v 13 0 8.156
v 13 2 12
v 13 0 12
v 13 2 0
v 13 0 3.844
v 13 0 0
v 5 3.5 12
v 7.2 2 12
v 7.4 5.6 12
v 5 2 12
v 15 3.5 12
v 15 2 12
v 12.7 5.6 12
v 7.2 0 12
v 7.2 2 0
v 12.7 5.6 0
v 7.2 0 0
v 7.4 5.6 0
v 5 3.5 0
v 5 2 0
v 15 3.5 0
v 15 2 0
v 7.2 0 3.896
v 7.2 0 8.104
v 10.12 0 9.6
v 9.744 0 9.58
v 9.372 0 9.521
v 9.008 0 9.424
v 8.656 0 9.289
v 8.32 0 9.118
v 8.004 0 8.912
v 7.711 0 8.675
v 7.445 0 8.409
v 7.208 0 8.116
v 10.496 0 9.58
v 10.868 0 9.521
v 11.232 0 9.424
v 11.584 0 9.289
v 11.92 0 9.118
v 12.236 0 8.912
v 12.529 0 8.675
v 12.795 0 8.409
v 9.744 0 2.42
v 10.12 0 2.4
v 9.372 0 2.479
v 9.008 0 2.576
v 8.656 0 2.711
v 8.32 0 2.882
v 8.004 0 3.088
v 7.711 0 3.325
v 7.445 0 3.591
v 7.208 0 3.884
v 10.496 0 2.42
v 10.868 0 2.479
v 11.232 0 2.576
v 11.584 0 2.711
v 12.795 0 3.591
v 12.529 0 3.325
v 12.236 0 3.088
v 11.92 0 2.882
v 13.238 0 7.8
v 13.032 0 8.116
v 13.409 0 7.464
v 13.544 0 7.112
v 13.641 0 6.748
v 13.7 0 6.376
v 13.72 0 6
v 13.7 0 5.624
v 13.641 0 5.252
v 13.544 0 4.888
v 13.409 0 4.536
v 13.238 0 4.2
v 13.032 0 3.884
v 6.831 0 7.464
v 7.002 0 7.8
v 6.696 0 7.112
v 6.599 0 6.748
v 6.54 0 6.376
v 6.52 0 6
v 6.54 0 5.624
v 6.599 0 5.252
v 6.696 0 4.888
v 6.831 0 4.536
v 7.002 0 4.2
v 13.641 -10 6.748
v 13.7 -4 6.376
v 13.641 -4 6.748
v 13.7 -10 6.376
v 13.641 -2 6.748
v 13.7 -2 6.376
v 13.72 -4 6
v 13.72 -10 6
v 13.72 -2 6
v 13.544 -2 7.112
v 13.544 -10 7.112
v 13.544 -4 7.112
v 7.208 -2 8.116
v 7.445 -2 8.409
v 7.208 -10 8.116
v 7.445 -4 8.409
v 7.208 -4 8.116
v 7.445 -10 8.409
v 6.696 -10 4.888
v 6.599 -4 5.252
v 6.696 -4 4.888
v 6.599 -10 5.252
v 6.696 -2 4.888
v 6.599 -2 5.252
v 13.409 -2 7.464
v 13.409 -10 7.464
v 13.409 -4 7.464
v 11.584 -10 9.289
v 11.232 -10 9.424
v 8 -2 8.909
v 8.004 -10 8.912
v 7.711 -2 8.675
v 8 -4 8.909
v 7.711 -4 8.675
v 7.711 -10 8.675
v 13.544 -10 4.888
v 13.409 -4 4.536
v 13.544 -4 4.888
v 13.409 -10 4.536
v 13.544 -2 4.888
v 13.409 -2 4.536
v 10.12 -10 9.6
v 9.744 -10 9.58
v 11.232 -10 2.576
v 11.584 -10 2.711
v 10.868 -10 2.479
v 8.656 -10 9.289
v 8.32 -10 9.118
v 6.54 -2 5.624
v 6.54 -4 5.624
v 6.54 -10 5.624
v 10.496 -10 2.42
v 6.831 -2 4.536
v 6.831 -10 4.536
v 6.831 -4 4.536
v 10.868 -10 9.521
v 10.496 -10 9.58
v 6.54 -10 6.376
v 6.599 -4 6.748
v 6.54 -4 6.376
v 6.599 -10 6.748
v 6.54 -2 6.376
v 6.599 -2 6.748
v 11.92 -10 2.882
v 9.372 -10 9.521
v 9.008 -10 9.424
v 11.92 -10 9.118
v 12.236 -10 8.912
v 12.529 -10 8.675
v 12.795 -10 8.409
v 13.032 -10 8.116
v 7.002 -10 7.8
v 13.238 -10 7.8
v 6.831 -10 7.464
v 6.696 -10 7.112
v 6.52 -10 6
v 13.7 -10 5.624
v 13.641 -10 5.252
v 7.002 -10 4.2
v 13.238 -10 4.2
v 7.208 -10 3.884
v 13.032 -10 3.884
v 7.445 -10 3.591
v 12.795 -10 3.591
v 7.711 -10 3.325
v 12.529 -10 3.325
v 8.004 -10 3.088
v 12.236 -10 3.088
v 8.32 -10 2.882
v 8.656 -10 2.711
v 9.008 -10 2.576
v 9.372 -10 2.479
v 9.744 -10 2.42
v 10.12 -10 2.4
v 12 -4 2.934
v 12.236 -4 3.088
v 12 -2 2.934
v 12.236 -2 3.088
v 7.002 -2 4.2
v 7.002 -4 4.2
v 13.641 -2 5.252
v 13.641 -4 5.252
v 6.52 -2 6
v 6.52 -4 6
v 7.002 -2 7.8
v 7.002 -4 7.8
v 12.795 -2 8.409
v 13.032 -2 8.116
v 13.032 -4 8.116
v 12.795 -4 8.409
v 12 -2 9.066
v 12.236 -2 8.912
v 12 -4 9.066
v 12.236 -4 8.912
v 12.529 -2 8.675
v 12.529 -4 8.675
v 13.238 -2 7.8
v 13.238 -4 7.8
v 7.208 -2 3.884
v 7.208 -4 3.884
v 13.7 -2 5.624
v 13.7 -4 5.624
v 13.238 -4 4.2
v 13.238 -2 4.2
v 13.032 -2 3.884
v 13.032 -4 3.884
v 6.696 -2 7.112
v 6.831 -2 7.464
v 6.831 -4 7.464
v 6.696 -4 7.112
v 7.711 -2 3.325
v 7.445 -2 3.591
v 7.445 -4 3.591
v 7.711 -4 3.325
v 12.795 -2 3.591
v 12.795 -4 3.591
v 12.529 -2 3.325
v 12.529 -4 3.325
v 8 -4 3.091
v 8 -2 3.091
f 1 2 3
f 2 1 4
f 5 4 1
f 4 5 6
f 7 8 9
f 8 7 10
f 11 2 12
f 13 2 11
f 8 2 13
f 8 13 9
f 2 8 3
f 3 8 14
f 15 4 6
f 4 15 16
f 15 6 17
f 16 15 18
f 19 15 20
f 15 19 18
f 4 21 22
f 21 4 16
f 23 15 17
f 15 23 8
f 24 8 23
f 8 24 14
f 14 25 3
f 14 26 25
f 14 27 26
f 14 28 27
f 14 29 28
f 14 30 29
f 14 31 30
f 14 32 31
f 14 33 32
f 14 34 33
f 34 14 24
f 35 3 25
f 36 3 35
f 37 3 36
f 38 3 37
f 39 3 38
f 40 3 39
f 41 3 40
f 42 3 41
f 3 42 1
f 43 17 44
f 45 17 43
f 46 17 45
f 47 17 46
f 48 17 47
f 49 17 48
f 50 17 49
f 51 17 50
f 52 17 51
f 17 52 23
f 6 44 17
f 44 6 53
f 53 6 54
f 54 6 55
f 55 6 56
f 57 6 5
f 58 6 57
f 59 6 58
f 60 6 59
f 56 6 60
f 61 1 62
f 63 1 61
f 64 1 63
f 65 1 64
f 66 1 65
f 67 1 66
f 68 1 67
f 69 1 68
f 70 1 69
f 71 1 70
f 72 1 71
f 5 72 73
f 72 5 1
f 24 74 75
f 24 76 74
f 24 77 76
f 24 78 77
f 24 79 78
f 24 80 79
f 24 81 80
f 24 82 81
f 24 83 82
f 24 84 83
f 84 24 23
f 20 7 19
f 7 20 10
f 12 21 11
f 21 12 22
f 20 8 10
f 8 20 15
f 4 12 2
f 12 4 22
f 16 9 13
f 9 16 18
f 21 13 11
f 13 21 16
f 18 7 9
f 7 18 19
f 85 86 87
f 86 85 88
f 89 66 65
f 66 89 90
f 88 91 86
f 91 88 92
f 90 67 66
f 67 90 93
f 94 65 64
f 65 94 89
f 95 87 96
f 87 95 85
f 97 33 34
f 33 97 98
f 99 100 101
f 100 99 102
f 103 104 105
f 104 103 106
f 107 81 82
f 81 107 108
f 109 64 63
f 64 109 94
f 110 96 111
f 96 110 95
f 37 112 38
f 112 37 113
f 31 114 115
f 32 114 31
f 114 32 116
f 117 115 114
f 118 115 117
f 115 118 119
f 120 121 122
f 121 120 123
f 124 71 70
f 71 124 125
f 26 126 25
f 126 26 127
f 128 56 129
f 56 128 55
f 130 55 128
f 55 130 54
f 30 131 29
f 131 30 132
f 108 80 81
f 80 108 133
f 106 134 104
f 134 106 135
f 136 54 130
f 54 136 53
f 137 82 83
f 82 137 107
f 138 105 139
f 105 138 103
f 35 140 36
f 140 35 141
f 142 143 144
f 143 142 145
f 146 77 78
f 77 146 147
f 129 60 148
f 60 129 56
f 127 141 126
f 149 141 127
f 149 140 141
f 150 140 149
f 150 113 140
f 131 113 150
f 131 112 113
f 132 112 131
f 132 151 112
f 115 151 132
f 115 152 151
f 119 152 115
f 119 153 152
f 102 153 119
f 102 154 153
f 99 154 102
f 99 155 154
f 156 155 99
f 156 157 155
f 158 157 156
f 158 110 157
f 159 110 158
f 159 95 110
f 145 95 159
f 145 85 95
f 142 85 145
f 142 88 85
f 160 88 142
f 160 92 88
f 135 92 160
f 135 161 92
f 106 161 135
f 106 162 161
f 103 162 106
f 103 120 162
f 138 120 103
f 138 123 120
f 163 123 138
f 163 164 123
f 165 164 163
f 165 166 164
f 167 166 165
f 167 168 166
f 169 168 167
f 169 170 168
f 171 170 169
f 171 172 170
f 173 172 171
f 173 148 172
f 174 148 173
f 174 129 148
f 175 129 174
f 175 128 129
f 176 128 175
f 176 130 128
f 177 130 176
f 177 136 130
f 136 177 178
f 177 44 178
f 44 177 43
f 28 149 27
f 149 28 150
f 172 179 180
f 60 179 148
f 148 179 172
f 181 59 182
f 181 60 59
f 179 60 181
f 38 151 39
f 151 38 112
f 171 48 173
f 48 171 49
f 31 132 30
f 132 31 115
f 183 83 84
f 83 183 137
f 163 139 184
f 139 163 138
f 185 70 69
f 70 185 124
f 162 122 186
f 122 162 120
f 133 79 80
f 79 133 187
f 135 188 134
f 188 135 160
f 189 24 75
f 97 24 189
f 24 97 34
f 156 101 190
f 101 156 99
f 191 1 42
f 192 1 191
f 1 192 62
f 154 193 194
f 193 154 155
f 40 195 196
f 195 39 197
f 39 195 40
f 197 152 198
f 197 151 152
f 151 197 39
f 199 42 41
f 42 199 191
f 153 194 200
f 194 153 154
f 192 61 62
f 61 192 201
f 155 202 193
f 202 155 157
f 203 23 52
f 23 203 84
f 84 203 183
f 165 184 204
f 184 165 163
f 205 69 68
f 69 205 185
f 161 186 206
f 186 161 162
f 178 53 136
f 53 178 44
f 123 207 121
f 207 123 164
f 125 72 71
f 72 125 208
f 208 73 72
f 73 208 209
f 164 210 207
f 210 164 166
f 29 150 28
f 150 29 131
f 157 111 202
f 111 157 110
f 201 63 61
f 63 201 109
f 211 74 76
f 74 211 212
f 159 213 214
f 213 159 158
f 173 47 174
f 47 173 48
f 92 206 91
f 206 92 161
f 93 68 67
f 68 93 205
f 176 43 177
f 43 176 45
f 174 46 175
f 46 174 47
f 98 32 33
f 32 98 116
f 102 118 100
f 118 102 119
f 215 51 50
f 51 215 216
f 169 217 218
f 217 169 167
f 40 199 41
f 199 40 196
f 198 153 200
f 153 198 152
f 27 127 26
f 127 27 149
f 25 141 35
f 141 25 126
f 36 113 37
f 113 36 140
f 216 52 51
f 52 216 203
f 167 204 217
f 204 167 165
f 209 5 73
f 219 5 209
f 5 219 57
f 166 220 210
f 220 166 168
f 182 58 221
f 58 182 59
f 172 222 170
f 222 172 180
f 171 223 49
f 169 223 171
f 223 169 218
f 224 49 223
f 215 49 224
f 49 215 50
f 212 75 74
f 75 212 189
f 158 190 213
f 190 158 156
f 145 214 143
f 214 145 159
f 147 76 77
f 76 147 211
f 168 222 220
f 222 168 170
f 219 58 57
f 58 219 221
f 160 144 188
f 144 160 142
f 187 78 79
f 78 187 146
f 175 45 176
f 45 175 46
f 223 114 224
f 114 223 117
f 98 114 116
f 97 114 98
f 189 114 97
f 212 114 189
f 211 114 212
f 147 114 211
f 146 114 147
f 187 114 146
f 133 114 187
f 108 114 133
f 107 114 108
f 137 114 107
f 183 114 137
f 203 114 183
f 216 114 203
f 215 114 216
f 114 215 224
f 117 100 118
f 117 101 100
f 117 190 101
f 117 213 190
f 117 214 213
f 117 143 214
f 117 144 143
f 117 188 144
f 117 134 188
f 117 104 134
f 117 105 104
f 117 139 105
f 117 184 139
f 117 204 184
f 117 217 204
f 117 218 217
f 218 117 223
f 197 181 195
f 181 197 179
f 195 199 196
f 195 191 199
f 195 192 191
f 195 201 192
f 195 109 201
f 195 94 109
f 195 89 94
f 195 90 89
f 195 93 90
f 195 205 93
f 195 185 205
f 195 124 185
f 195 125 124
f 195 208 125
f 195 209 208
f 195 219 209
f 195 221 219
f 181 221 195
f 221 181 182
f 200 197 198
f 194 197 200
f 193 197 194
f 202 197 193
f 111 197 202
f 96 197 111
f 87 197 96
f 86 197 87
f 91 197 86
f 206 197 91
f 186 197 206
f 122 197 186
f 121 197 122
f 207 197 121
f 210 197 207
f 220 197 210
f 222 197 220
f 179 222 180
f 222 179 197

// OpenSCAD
echo(version=version());
//include <threads.scad>


// Base Config
base_W = 120; // Min Size < 10
base_H = 40; // Min Size < 40
base_T = 0.5; // Fix Size = 0.5 for Stapler
default_S = 12; // Fix Size = 12 for Stapler (Stapler size)
default_T = 3.0; // Fix Size = 2.0 for Stapler (base_T < default_T)
$fn = 60;
minkowski_R = 2;
outR=14;
pitchN=4;
interR=9;
bladehuckR=0;

// * difference(){
//     import("2020 alu section.STL", convexity=3);
//     translate([-5, -5, 10]) cube([30, 30, 500]);
// }

difference(){
    union() {
        translate([7.2, 0, 0]) cube([5.8, 3, 12]);
        hull() {
            translate([5, 2, 0]) cube([10, 1.5, 12]);
            translate([7.4, 5.5, 0]) cube([5.3, 0.1, 12]);
        }
        #translate([10.12, 0, 6]) rotate([90, 0, 0]) cylinder(h=10, r=3.6, center=false);
    }
    // translate([10, 8, 5]) rotate([90, 0, 0]) cylinder(h=10, r=2, center=false);
    // translate([10, 8, 15]) rotate([90, 0, 0]) cylinder(h=10, r=2, center=false);
    translate([3, -4, 0]) cube([5, 2, 12]);
    translate([12, -4, 0]) cube([5, 2, 12]);
    // *translate([87.5, 60, -19]) rotate([0, 0, 180]) import("M3x15x0.5 Philips Pan Head Screw.stl", convexity=3);
    // *translate([87.5, 60, -9]) rotate([0, 0, 180]) import("M3x15x0.5 Philips Pan Head Screw.stl", convexity=3);
    // *translate([87.5, 60, 1]) rotate([0, 0, 180]) import("M3x15x0.5 Philips Pan Head Screw.stl", convexity=3);
}


*union() {
    hull() {
        translate([2.8, -3.9, 12]) cube([5, 1.8, 0.1]);
        translate([2.8, -3.9, 0]) cube([5, 2.1, 0.1]);
    }
    hull() {
        translate([12.8, -3.9, 12]) cube([5, 1.8, 0.1]);
        translate([12.8, -3.9, 0]) cube([5, 2.1, 0.1]);
    }
    difference(){
        translate([2.8, -3.9, 3.5]) rotate([0, 90, 0]) cube([5, 2, 15]);
        translate([10.12, 0, 6]) rotate([90, 0, 0]) cylinder(h=10, r=3.6, center=false);
    }
}

// translate([2, 2, 2]) {
//     // main body
//     *union() {
//         difference(){
//             union() {
//                 intersection() {
//                     union() {
//                             translate([0, 30.25, -7.75]) cube([18.75, 4.75, 17.75]);
//                             translate([0, 8, -7.75]) cube([8.5, 23, 7.5]);
//                             translate([10.25, 8, 2.5]) cube([8.5, 23, 7.5]);
//                     }
//                     translate([9.5, 36, 1.25]) rotate([90, 0, 0]) cylinder(h=30, r=interR, center=false);
//                 }
//                 // body screw
//                 translate([9.5, 35, 1.25]) rotate([90, 0, 0]) metric_thread (diameter=23, pitch=pitchN, length=13);
//             }
//             translate([-9.7, 8, -0.3]) cube([20, 22, 20]);
//             translate([8.5, 8, -17.5]) cube([20, 22, 20]);
//         }
//         // body
//         difference(){
//                 translate([9.5, 65, 1.25]) rotate([90, 0, 0]) cylinder(h=33, r=outR, center=false);
//                 translate([9.5, 65, 1.25]) rotate([90, 0, 0]) metric_thread (diameter=24, pitch=pitchN, length=10, internal=true);
//                 translate([9.5, 65, 1.25]) rotate([90, 0, 0]) cylinder(h=29, r=10.5, center=false);
//         }
//         // body plate
//         translate([-2.5, 33, 0]) cube([24, 21.8, 2]);
//         // suport parts
//         * translate([-0.5, 54.8, 1]) {
//             hull() {
//                 translate([0, 5.2, 1]) cube([20, 5, 0.1]);
//                 translate([0, 0, 0]) cube([20, 10.2, 0.1]);
//                 translate([0, 5.2, -1]) cube([20, 5, 0.1]);
//             }
//         }
//     }
//     // blade holder
//     *difference(){
//         union() {
//             intersection() {
//                 union() {
//                     union() {
//                         translate([0, 8, 0]) difference(){
//                             cube([10, 22, 10]);
//                             translate([8.8, 0, 0]) cube([5, 11.5, 11]);
//                             translate([0, 0, 0]) cube([11, 11.5, 1.2]);
//                         }
//                         translate([5, 11, 5.5]) rotate([0, 90, 0]) cylinder(h=5, r=1.4, center=false, $fn=20);
//                         translate([4.5, 11, 0]) rotate([0, 0, 0]) cylinder(h=5, r=1.4, center=false, $fn=20);
//                     }
//                     translate([8.7, 0, -7.7]) rotate([0, 90, 0]) mirror([1,0,0]) union() {
//                         translate([0, 8, 0]) difference(){
//                             cube([10, 22, 10]);
//                             translate([8.8, 0, 0]) cube([5, 11.5, 11]);
//                             translate([0, 0, 0]) cube([11, 11.5, 1.2]);
//                         }
//                         translate([5, 11, 5.5]) rotate([0, 90, 0]) cylinder(h=5, r=1.4, center=false, $fn=20);
//                         translate([4.5, 11, 0]) rotate([0, 0, 0]) cylinder(h=5, r=1.4, center=false, $fn=20);
//                     }
//                 }
//                 translate([9.5, 36, 1.25]) rotate([90, 0, 0]) cylinder(h=30, r=interR, center=false);
//             }
//             // body screw
//             translate([9.5, 35, 1.25]) rotate([90, 0, 0]) metric_thread (diameter=23, pitch=pitchN, length=13);
//         }
//         translate([10, 8, 2.3]) cube([20, 22, 20]);
//         translate([-11.2, 8, -20]) cube([20, 22, 20]);
//         translate([-5, 30, -15]) cube([30, 10, 30]);
//     }

//     // cap
//     *union() {
//         translate([9.5, 85, 1.25]) rotate([90, 0, 0]) cylinder(h=8, r=outR, center=false);
//         translate([9.5, 80, 1.25]) rotate([90, 0, 0]) metric_thread (diameter=23, pitch=pitchN, length=9.5);
//     }

//     // main cap
//     *difference(){
//         translate([9.5, 0, 1.25]) rotate([90, 0, 0]) cylinder(h=43, r=outR, center=false);
//         translate([9.5, 5, 1.25]) rotate([90, 0, 0]) metric_thread (diameter=24, pitch=pitchN, length=45, internal=true);
//     }

//     // stopper ring
//     *difference(){
//         translate([9.5, 0, 1.25]) rotate([90, 0, 0]) cylinder(h=43, r=outR, center=false);
//         translate([9.5, 5, 1.25]) rotate([90, 0, 0]) metric_thread (diameter=24.3, pitch=pitchN, length=45, internal=true);
//         translate([-10, -45, -20]) cube([40, 40, 40]);
//     }



// }
